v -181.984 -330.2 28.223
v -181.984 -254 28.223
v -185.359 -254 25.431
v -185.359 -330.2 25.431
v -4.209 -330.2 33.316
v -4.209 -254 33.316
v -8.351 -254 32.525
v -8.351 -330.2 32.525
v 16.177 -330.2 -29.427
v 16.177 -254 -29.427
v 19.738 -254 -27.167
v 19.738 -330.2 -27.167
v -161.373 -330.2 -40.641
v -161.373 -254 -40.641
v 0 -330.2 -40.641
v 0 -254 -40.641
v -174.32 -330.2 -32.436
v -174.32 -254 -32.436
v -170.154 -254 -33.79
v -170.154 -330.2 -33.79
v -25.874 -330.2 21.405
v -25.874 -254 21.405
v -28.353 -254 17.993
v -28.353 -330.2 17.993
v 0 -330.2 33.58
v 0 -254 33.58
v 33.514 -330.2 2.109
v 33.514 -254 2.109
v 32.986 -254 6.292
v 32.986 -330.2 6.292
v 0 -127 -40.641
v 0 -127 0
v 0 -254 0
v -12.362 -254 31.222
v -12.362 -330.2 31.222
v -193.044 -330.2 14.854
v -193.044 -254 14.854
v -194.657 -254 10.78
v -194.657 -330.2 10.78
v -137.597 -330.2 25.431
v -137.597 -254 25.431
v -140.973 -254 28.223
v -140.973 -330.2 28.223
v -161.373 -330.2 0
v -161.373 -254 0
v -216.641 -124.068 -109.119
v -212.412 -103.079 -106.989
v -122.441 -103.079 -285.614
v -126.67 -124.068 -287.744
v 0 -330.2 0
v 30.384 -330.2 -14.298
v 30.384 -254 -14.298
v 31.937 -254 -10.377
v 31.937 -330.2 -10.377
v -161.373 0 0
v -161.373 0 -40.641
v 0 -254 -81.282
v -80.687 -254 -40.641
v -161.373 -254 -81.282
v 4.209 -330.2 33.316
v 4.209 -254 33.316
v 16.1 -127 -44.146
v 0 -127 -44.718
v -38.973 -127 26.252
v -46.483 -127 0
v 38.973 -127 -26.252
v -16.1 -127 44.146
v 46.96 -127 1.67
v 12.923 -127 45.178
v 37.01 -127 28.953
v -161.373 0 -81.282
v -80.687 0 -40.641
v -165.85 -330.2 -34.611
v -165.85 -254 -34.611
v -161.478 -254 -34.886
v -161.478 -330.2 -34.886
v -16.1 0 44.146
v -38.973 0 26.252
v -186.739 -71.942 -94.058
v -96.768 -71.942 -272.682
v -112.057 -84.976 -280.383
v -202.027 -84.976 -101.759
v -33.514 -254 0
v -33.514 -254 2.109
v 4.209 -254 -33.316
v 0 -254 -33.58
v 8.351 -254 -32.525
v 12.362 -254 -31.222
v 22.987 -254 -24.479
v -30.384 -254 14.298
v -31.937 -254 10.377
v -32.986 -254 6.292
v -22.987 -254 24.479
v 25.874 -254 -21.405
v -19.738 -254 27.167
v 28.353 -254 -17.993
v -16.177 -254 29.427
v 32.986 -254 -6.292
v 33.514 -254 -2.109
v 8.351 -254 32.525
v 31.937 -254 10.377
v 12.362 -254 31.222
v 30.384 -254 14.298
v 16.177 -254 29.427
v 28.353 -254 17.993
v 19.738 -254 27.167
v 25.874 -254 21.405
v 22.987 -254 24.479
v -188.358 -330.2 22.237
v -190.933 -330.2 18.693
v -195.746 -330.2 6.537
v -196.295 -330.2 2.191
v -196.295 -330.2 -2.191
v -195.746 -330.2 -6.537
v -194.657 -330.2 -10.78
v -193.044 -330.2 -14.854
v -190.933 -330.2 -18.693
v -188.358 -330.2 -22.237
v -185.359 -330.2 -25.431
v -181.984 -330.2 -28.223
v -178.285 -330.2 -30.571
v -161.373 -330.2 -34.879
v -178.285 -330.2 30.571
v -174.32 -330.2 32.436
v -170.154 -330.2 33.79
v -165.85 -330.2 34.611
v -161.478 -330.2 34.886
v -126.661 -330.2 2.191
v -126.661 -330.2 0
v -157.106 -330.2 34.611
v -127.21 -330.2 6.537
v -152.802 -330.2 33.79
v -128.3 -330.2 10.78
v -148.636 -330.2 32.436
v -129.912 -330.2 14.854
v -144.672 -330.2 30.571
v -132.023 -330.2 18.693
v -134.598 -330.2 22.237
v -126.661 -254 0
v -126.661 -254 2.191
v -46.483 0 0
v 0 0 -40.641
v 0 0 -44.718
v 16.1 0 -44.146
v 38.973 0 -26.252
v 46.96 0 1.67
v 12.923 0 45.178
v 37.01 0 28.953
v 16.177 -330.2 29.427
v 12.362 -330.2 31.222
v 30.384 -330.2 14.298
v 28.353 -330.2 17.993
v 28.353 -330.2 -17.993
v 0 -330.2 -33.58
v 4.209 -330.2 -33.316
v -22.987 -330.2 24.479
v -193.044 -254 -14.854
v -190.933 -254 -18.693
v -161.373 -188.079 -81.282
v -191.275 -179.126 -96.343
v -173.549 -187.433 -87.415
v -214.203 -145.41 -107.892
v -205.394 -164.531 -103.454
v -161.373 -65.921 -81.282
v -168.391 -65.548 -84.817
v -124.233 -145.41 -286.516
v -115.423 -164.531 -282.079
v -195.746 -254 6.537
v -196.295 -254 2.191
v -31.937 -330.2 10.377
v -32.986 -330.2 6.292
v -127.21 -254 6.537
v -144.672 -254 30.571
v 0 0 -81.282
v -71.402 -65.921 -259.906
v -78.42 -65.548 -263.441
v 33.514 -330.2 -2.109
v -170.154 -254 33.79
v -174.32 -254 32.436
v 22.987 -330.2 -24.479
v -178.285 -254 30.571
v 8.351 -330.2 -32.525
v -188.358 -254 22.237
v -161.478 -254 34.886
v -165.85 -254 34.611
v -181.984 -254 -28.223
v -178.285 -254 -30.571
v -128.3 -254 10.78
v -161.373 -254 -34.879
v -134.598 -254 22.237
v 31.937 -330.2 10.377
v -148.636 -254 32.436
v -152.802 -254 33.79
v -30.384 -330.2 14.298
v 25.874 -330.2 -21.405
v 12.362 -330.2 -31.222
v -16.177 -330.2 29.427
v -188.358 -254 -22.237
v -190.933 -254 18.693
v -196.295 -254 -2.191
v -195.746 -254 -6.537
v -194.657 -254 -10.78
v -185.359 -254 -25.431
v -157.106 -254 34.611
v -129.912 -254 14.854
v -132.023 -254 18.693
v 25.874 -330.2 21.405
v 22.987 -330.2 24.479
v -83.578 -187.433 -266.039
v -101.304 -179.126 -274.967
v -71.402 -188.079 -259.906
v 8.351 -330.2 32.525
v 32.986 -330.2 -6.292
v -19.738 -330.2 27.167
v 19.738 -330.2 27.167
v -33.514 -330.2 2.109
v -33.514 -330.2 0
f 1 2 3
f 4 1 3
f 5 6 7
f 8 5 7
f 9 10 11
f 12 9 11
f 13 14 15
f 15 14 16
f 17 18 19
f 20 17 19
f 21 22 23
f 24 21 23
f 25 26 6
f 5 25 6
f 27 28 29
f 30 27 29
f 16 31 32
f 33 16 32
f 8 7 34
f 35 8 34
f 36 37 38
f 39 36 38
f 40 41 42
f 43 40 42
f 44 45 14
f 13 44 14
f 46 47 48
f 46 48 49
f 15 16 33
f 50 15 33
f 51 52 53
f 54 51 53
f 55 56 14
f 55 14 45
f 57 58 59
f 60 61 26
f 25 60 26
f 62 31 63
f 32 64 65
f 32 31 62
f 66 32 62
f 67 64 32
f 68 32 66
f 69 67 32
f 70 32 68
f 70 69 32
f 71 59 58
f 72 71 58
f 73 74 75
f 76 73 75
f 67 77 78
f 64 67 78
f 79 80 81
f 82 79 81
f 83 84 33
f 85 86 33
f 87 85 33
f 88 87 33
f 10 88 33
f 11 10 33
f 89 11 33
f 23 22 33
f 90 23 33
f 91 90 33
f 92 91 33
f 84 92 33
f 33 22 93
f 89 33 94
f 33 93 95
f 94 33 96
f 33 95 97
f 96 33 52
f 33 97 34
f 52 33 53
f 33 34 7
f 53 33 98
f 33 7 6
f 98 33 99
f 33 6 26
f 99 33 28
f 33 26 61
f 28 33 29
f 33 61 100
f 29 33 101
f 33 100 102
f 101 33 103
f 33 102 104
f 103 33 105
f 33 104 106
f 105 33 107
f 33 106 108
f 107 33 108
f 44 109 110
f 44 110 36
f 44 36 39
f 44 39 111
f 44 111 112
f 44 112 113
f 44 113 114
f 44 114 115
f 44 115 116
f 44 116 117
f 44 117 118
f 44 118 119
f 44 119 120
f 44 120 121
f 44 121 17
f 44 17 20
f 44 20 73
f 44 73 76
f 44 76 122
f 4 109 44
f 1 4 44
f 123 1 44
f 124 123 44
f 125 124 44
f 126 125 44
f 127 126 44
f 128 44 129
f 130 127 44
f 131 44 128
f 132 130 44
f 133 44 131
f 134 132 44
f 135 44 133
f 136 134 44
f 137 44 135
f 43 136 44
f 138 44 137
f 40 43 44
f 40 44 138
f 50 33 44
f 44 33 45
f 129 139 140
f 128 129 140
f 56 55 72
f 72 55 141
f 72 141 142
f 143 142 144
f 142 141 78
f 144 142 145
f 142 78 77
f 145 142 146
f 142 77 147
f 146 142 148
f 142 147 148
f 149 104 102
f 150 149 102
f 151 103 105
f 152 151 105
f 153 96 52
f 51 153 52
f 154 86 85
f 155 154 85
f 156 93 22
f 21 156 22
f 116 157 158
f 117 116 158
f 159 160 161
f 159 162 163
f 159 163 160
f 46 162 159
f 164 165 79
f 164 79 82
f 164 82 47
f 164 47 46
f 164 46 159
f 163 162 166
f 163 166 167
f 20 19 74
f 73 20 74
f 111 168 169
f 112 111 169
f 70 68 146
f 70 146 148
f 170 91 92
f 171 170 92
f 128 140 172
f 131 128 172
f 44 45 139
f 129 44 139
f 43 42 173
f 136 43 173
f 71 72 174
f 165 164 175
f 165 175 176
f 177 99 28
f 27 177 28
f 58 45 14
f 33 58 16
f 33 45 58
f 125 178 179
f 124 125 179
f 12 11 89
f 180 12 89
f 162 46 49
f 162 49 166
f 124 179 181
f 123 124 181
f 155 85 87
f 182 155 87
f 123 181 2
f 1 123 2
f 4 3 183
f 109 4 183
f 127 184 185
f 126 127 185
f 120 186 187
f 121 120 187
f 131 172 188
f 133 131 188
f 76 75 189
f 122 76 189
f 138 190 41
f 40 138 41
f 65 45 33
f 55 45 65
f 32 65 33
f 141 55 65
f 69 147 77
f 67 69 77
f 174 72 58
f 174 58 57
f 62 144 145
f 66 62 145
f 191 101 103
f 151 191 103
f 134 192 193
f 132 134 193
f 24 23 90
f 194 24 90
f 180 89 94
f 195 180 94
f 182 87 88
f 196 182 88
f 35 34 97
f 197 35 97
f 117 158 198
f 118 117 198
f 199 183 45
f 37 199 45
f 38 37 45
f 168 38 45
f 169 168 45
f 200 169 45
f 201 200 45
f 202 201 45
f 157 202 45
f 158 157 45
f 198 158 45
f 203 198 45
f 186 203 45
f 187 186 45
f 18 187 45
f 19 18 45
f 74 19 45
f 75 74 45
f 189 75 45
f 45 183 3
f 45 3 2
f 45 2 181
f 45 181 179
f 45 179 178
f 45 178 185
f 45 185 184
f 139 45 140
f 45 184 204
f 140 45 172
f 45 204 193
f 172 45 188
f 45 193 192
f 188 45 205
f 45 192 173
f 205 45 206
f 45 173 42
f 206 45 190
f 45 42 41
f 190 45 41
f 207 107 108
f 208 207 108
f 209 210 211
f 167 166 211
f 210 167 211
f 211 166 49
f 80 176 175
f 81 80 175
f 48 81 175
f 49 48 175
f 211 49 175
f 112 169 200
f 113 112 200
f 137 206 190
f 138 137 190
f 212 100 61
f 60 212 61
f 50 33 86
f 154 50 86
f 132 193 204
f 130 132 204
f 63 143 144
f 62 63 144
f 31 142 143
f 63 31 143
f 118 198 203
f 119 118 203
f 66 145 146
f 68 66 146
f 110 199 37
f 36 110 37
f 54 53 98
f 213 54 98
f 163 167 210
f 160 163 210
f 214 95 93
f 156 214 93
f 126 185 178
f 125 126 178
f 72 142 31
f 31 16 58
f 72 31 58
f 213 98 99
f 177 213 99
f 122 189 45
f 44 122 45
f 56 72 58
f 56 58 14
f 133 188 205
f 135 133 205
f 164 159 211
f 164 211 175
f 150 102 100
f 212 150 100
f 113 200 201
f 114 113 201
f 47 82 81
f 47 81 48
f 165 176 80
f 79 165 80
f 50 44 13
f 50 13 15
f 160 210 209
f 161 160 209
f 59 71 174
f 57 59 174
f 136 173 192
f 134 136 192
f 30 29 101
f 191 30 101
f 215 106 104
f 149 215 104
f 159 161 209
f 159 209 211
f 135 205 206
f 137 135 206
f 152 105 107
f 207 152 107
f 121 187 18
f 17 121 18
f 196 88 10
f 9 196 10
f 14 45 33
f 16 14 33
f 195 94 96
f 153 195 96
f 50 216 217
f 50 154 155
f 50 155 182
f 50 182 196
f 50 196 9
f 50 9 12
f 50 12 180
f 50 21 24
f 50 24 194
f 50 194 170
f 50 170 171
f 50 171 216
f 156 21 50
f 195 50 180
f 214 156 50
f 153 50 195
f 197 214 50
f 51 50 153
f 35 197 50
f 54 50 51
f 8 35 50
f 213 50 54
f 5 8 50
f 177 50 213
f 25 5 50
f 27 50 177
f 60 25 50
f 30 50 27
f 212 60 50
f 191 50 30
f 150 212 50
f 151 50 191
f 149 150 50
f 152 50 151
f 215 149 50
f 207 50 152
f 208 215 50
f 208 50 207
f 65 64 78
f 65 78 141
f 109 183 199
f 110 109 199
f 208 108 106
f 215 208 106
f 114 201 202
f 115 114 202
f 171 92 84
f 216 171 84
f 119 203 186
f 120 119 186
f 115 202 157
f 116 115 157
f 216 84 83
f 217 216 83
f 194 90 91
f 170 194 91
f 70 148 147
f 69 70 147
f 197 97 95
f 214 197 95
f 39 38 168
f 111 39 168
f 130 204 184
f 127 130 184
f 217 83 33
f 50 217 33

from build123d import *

# Parameters (mm, degrees)
F0_W      = 161.3730043173
F0_H      = 81.2815725803
F2_DEPTH  = 254
F4_DEPTH  = 254.001
F6_DEPTH  = 254.001
F9_DEPTH  = 76.2
F11_DEPTH = 76.2
F13_DEPTH = 127
F15_DEPTH = 200.00349


with BuildPart() as f2:
    # F0 (on Front) → F2 (new body)
    with BuildSketch(Plane.XZ):
        with Locations((-80.6865021586, -40.6407862902)):
            Rectangle(F0_W, F0_H)
    extrude(amount=F2_DEPTH)

    # F3 (on face) → F4 (cut, through all)
    with BuildSketch(Plane.XZ.offset(254)):
        Polygon((-161.3730043173, -40.6407862902), (-161.3730043173, -81.2815725803), (-80.6865021586, -40.6407862902), align=None)
    extrude(amount=-F4_DEPTH, mode=Mode.SUBTRACT)

    # F5 (on face) → F6 (cut, through all)
    with BuildSketch(Plane.XZ.offset(254)):
        Polygon((0, -40.6407862902), (-80.6865021586, -40.6407862902), (0, -81.2815725803), align=None)
    extrude(amount=-F6_DEPTH, mode=Mode.SUBTRACT)

    # F12 (on face) → F13 (join)
    with BuildSketch(Plane.XZ):
        Polygon((38.9730583825, -26.2516677193), (46.9602096877, 1.6697436384), (37.010157011, 28.9533696787), (12.9234822851, 45.1777925906), (-16.0995234208, 44.1458342696), (-38.9730583825, 26.2516677193), (-46.4825656707, 0), (0, 0), (0, -44.7182779829), (16.0995234208, -44.1458342696), align=None)
    extrude(amount=F13_DEPTH)


with BuildPart() as f9:
    # F8 (on face) → F9 (new body)
    with BuildSketch(Plane.XZ.offset(254)):
        Polygon((-33.5141047835, 2.1085287508), (-33.5141047835, 0), (0, 0), (0, -33.580367969), (4.2087361018, -33.3155767376), (8.3510979212, -32.5253789593), (12.3617579376, -31.2222365251), (16.1774656468, -29.4267007696), (19.7380450587, -27.1670883643), (22.9873437092, -24.4790347467), (25.8741182174, -21.404932128), (28.3528424249, -17.9932609431), (30.3844253701, -14.2978252843), (31.9368277765, -10.3769043798), (32.9855673307, -6.2923334943), (33.5141047835, -2.1085287508), (33.5141047835, 2.1085287508), (32.9855673307, 6.2923334943), (31.9368277765, 10.3769043798), (30.3844253701, 14.2978252843), (28.3528424249, 17.9932609431), (25.8741182174, 21.404932128), (22.9873437092, 24.4790347467), (19.7380450587, 27.1670883643), (16.1774656468, 29.4267007696), (12.3617579376, 31.2222365251), (8.3510979212, 32.5253789593), (4.2087361018, 33.3155767376), (0, 33.580367969), (-4.2087361018, 33.3155767376), (-8.3510979212, 32.5253789593), (-12.3617579376, 31.2222365251), (-16.1774656468, 29.4267007696), (-19.7380450587, 27.1670883643), (-22.9873437092, 24.4790347467), (-25.8741182174, 21.404932128), (-28.3528424249, 17.9932609431), (-30.3844253701, 14.2978252843), (-31.9368277765, 10.3769043798), (-32.9855673307, 6.2923334943), align=None)
    extrude(amount=F9_DEPTH)


with BuildPart() as f11:
    # F7 (on face) → F11 (new body)
    with BuildSketch(Plane.XZ.offset(254)):
        Polygon((-161.3730043173, 0), (-161.3730043173, -40.6407862902), (-80.6865021586, -40.6407862902), (0, -40.6407862902), (0, 0), align=None)
    extrude(amount=F11_DEPTH)


with BuildPart() as f11b:
    # F10 (on face) → F11, piece 2 (new body)
    with BuildSketch(Plane.XZ.offset(254)):
        Polygon((-126.6610324383, 0), (-126.6610324383, 2.1905043593), (-127.2101184272, 6.5369675155), (-128.2996309911, 10.780338789), (-129.9123878659, 14.8536976799), (-132.0229549123, 18.6928048853), (-134.5980472273, 22.2371153911), (-137.5970540666, 25.4307333034), (-140.9726793009, 28.2232933598), (-144.6716873038, 30.5707552202), (-148.6357425094, 32.4360980088), (-152.8023293991, 33.7899041553), (-157.1057384086, 34.6108233282), (-161.4781022072, 34.8859091417), (-165.8504660057, 34.6108233282), (-170.1538750153, 33.7899041553), (-174.320461905, 32.4360980088), (-178.2845171106, 30.5707552202), (-181.9835251135, 28.2232933598), (-185.3591503478, 25.4307333034), (-188.3581571871, 22.2371153911), (-190.933249502, 18.6928048853), (-193.0438165484, 14.8536976799), (-194.6565734232, 10.780338789), (-195.7460859871, 6.5369675155), (-196.2951719761, 2.1905043593), (-196.2951719761, -2.1905043593), (-195.7460859871, -6.5369675155), (-194.6565734232, -10.780338789), (-193.0438165484, -14.8536976799), (-190.933249502, -18.6928048853), (-188.3581571871, -22.2371153911), (-185.3591503478, -25.4307333034), (-181.9835251135, -28.2232933598), (-178.2845171106, -30.5707552202), (-174.320461905, -32.4360980088), (-170.1538750153, -33.7899041553), (-165.8504660057, -34.6108233282), (-161.4781022072, -34.8859091417), (-161.3730043173, -34.8792969429), (-161.3730043173, 0), align=None)
    extrude(amount=F11_DEPTH)


with BuildPart() as f15:
    # F14 (on face) → F15 (new body)
    with BuildSketch(Plane(origin=(0, 0, 0), x_dir=(0.8931059627, 0, 0.4498463509), z_dir=(-0.4498463509, 0, 0.8931059627))):
        Polygon((-214.1681429585, -179.1259709386), (-194.3208757202, -187.4334749195), (-180.6874111927, -188.0794664983), (-180.6874111927, -65.9205335017), (-188.5456109341, -65.548190078), (-209.0894603395, -71.9418502842), (-226.2076034482, -84.9763359179), (-237.8353395644, -103.0794956431), (-242.5701921053, -124.0678212228), (-239.8410679756, -145.4098108374), (-229.9771398229, -164.5313055651), align=None)
    extrude(amount=-F15_DEPTH)


solid = Compound([f2.part, f9.part, f11.part, f11b.part, f15.part])
